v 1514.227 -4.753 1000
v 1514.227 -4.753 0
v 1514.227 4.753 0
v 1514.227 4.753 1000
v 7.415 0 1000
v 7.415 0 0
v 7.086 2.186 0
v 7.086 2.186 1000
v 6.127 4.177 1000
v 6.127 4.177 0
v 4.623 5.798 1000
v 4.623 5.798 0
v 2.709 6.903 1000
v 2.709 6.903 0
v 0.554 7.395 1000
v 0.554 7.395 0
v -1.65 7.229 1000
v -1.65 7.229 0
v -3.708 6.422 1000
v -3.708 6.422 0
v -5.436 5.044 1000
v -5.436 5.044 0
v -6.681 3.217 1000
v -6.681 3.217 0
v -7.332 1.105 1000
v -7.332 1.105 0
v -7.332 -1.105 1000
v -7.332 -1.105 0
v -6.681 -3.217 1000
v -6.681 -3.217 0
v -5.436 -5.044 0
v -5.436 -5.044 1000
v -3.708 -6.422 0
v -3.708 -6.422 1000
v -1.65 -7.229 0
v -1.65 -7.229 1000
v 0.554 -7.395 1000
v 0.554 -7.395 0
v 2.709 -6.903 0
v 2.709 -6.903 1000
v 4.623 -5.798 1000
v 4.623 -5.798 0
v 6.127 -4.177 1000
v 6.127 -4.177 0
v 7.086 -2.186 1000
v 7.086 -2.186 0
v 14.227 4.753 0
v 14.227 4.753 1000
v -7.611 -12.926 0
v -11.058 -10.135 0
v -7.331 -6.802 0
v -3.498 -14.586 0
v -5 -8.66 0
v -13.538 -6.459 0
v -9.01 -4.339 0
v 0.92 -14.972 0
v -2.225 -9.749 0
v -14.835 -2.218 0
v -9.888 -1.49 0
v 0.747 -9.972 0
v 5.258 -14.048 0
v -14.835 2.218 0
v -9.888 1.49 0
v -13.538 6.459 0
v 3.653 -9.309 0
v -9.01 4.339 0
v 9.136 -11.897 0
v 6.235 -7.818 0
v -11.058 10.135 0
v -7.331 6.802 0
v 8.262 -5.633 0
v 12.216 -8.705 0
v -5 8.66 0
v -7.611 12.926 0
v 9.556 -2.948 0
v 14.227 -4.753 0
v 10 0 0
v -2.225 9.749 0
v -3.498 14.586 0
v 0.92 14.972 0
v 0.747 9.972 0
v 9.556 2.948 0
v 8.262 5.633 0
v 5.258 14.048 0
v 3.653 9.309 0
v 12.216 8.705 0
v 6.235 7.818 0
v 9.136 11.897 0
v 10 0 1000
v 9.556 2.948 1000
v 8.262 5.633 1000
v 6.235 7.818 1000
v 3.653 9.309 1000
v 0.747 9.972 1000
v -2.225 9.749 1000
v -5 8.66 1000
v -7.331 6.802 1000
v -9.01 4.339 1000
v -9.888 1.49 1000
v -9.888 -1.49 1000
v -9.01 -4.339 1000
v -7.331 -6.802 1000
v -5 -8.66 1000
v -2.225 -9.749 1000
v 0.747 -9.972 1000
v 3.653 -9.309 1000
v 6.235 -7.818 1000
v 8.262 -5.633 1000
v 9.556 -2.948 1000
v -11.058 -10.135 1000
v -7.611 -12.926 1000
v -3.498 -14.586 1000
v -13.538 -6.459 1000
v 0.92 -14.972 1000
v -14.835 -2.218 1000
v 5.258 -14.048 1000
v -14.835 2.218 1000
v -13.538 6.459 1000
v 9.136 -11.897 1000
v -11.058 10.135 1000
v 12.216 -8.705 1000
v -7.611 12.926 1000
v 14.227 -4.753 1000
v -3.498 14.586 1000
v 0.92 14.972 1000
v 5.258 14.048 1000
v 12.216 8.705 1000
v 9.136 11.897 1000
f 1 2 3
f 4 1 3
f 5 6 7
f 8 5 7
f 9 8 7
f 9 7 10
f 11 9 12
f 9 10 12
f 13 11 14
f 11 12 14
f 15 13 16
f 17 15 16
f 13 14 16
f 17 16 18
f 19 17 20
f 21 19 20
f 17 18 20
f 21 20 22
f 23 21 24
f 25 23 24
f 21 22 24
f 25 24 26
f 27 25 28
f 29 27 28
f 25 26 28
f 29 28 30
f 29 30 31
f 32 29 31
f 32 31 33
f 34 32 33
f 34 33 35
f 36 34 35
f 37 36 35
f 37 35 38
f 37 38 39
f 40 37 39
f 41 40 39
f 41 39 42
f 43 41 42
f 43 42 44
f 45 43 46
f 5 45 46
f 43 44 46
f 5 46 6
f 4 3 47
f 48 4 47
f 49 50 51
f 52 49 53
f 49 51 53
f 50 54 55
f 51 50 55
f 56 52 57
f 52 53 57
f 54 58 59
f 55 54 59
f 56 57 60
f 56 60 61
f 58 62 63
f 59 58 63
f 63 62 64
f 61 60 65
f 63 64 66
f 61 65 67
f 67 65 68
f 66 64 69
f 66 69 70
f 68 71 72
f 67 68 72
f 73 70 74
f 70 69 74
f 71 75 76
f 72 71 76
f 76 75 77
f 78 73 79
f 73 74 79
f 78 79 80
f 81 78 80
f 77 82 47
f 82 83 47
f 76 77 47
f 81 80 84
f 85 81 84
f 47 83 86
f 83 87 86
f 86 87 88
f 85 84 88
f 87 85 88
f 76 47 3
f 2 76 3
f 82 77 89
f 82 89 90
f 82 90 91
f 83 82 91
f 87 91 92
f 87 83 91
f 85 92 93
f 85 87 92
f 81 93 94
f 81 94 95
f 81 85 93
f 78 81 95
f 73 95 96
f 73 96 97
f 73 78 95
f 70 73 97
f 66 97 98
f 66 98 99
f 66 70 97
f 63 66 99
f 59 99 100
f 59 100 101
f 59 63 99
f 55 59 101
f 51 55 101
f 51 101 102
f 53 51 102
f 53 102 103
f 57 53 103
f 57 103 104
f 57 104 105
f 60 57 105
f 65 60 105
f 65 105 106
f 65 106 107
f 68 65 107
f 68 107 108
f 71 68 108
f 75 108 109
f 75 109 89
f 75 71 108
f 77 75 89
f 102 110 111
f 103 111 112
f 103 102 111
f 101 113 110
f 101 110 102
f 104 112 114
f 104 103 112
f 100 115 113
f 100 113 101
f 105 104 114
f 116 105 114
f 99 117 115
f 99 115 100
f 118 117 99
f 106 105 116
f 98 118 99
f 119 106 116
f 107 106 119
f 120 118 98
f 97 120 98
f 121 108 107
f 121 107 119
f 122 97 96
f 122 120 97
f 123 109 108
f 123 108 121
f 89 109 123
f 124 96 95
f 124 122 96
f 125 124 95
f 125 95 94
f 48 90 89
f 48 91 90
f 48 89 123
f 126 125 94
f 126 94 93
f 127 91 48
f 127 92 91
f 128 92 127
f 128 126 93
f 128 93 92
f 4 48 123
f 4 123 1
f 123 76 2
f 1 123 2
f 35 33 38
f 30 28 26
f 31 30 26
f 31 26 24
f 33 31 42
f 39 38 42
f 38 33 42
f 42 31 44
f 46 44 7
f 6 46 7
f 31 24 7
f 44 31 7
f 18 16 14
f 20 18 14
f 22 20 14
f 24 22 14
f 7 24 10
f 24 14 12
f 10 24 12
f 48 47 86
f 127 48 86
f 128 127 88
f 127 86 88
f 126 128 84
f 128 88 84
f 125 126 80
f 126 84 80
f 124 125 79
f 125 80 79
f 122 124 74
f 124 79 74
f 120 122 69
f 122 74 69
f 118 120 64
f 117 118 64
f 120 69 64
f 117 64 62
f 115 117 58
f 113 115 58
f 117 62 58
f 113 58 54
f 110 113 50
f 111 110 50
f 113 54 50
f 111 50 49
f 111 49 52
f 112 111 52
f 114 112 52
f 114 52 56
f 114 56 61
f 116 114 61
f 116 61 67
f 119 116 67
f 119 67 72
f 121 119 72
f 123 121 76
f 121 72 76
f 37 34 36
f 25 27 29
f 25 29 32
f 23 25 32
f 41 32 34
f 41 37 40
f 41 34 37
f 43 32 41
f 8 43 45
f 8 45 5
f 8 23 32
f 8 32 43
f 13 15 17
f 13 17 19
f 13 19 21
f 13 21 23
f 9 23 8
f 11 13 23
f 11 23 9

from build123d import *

# Parameters (mm, degrees)
F0_R     = 7.415285
F1_DEPTH = 1000
F2_R     = 10
F3_DEPTH = 1000


with BuildPart() as f1:
    # F0 (on Top) → F1 (new body)
    with BuildSketch(Plane.XY):
        Circle(F0_R)
    extrude(amount=F1_DEPTH)


with BuildPart() as f3:
    # F2 (on Top) → F3 (new body)
    with BuildSketch(Plane.XY):
        with BuildLine():
            Line((1514.227172, 4.75264), (14.227172, 4.75264))
            ThreePointArc((14.227172, 4.75264), (-15, 0), (14.227172, -4.75264))
            Line((14.227172, -4.75264), (1514.227172, -4.75264))
            Line((1514.227172, -4.75264), (1514.227172, 4.75264))
        make_face()
        Circle(F2_R, mode=Mode.SUBTRACT)
    extrude(amount=F3_DEPTH)


solid = Compound([f1.part, f3.part])
